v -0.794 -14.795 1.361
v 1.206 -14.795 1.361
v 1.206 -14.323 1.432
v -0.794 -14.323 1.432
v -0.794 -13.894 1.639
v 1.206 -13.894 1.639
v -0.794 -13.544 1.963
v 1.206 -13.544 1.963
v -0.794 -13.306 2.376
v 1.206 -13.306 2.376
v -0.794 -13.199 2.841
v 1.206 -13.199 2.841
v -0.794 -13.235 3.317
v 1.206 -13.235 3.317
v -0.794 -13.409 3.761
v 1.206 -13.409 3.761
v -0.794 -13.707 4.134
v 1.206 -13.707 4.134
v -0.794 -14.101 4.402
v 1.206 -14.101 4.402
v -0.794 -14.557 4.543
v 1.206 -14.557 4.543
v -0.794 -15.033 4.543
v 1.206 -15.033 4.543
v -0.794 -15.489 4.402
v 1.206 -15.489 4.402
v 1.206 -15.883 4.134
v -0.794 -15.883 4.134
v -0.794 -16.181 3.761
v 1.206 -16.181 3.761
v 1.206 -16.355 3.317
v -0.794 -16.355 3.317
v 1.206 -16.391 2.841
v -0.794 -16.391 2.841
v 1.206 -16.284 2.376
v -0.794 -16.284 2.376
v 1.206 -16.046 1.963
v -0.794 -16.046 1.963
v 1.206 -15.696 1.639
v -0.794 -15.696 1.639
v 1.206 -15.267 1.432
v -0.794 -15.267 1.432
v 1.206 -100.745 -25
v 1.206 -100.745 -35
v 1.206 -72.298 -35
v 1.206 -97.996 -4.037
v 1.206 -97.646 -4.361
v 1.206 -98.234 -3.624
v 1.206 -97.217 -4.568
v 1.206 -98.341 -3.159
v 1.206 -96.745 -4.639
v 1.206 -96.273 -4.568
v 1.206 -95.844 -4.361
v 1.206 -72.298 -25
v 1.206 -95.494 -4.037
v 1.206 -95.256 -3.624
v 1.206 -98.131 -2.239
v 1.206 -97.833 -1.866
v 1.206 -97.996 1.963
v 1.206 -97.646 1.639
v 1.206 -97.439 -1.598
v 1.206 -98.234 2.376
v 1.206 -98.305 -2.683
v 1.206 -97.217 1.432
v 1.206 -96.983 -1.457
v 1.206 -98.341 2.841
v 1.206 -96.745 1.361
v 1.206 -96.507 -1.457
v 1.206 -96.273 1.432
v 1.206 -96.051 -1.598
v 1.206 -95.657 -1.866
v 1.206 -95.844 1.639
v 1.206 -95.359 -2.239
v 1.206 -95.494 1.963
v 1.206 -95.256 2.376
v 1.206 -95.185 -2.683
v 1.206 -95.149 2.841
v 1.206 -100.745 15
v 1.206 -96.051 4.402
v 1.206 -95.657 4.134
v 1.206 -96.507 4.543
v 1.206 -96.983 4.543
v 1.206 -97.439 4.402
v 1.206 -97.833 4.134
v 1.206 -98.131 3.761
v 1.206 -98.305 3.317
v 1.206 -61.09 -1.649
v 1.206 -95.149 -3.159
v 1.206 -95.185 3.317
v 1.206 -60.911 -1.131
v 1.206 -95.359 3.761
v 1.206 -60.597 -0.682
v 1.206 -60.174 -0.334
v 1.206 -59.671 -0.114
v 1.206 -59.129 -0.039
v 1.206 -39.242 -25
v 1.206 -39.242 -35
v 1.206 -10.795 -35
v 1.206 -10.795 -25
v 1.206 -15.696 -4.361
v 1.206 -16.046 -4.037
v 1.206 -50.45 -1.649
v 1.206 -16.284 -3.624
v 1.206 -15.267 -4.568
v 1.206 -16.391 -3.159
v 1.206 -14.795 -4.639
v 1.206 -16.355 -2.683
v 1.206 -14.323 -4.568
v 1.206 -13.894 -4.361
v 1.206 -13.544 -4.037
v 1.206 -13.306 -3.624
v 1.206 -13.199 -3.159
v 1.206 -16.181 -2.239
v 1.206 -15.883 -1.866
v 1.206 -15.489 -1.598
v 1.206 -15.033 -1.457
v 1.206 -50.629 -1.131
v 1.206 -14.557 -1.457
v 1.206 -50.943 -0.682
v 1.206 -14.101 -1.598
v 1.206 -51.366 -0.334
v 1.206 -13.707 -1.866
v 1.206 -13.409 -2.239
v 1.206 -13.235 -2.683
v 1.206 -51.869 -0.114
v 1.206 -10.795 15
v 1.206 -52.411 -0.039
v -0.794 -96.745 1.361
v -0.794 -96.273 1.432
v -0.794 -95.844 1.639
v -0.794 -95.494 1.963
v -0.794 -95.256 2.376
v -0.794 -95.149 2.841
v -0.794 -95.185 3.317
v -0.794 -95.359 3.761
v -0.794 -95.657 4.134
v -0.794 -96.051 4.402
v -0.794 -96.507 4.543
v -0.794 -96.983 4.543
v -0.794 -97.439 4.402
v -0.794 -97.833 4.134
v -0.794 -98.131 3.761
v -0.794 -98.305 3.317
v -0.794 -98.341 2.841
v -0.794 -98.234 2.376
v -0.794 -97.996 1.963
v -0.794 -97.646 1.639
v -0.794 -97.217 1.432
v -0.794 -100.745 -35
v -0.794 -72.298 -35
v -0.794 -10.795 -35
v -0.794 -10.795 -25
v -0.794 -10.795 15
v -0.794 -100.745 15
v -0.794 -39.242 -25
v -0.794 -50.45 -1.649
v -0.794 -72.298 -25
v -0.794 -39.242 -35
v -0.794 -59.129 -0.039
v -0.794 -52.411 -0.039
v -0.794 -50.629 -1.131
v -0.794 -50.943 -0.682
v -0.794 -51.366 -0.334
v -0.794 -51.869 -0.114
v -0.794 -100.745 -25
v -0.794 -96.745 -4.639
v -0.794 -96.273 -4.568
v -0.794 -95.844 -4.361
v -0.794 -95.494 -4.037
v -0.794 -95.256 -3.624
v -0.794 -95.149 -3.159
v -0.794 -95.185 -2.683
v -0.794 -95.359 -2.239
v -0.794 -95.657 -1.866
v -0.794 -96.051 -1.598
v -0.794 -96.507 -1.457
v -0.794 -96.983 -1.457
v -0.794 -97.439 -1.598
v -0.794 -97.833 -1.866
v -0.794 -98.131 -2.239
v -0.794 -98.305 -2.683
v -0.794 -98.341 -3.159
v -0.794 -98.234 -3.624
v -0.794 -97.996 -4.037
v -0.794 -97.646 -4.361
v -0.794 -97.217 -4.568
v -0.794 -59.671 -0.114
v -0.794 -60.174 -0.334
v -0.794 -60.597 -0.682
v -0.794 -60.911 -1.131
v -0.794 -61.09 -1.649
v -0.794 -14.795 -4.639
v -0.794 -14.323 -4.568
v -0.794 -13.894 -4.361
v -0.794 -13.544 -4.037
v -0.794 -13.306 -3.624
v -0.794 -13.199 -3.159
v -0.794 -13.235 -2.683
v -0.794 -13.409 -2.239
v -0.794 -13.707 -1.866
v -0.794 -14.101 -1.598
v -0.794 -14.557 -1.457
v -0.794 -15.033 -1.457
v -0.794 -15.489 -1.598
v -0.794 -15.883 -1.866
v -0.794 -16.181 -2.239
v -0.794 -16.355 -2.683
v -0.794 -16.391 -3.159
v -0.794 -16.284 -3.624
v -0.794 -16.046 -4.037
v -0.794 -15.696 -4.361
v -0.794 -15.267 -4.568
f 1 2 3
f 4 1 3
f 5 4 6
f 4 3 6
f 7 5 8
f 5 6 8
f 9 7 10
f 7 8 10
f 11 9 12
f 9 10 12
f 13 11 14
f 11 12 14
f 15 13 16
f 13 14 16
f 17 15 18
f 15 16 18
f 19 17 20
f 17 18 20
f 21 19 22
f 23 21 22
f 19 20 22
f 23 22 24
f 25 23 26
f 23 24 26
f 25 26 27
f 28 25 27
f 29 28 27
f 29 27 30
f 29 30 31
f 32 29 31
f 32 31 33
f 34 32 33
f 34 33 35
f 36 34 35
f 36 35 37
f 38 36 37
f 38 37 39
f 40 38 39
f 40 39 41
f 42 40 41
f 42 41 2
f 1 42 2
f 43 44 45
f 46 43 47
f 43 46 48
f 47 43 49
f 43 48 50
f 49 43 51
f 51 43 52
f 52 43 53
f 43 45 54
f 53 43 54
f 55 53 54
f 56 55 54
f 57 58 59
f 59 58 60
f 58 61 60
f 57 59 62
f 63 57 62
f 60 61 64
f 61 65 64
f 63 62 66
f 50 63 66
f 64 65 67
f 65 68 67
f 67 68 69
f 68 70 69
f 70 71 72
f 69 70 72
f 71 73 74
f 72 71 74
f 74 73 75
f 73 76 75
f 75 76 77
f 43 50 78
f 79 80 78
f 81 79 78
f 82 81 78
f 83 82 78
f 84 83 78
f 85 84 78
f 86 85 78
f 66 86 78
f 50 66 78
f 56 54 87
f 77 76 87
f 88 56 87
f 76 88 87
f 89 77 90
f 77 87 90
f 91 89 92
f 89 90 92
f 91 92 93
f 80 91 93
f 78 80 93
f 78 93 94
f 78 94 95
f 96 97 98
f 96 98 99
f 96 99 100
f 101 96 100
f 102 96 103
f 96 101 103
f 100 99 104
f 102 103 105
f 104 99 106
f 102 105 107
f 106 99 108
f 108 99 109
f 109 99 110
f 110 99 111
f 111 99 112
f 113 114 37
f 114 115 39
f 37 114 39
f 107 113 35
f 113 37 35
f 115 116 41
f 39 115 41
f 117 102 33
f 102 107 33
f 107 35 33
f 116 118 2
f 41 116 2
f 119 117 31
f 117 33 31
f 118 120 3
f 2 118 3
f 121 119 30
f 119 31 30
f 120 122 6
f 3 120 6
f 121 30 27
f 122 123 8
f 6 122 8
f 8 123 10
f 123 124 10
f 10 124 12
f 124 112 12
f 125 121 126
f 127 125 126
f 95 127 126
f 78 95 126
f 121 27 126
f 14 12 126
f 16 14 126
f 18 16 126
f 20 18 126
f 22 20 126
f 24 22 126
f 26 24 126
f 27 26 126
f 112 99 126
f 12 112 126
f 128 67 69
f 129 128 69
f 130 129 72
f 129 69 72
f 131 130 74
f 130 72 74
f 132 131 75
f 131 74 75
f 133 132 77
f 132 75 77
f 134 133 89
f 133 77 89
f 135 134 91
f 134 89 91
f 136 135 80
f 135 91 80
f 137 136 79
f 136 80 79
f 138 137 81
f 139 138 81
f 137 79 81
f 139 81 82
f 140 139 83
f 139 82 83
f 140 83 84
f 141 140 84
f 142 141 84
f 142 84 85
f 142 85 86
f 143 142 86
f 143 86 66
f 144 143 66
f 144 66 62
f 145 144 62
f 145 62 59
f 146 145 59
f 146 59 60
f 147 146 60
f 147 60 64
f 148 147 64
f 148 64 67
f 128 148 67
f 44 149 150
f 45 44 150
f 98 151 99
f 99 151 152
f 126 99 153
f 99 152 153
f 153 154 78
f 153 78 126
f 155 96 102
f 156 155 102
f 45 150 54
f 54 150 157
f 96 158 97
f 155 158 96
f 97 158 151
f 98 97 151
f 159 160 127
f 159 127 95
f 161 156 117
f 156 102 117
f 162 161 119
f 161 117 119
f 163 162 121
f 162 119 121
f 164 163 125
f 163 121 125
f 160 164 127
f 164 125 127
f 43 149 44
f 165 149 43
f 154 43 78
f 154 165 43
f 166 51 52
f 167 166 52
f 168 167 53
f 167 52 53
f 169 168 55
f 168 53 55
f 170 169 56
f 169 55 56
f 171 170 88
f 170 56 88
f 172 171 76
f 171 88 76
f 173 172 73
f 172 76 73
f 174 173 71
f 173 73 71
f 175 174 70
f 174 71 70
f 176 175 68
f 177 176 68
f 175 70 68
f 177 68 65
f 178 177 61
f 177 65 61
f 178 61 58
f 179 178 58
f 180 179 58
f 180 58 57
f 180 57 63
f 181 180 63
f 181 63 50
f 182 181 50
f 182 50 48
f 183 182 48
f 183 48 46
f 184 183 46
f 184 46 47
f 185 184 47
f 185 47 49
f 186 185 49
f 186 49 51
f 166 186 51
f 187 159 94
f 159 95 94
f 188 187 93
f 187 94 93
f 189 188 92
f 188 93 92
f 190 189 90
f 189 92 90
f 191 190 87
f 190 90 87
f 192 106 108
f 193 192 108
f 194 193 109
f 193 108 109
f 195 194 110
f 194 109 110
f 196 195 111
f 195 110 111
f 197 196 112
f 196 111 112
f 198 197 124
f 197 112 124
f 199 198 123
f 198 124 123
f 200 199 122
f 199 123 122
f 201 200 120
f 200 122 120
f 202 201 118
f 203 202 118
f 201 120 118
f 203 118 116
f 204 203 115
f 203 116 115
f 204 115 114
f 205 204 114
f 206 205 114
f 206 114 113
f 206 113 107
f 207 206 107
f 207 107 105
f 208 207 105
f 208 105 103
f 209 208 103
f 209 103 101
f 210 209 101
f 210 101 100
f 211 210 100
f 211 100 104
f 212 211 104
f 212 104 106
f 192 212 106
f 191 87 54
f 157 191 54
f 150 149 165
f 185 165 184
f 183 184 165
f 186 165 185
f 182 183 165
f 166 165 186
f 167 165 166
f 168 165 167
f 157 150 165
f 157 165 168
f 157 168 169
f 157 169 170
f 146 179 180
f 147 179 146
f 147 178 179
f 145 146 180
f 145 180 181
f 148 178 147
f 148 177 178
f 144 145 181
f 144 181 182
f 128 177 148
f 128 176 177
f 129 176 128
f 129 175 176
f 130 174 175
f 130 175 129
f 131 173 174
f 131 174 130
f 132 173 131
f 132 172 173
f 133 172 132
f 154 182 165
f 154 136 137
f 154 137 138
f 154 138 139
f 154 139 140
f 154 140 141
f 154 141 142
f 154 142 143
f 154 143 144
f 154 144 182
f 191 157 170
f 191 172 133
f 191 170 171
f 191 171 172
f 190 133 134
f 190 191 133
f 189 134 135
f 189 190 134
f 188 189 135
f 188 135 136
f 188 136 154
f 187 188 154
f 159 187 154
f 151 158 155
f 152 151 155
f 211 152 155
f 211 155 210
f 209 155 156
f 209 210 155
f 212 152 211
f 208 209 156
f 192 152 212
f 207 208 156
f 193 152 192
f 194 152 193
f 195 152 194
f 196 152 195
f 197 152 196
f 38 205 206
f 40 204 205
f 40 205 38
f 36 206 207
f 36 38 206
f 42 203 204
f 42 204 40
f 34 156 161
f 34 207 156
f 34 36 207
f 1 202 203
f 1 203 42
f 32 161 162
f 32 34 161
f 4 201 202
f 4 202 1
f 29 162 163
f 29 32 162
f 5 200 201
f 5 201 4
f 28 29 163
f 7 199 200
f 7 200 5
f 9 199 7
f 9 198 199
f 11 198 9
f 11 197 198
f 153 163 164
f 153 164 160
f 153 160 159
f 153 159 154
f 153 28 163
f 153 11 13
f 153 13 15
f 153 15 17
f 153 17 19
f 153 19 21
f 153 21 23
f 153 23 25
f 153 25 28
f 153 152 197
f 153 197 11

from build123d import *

# Parameters (mm, degrees)
EXTRUDE_1_DEPTH     = 2
FILLET_1_R          = 2
FILLET_2_R          = 2
FILLET_3_R          = 2
FILLET_4_R          = 2
SKETCH_2_W          = 12
SKETCH_2_H          = 89.95
EXTRUDE_2_DEPTH     = 2
CUT_EXTRUDE_1_DEPTH = 10
SKETCH_7_R          = 1.6
CUT_EXTRUDE_2_DEPTH = 10
SKETCH_8_W          = 10
SKETCH_8_H          = 28.446825321
EXTRUDE_3_DEPTH     = 2


with BuildPart() as part:
    # 草图1 → 凸台-拉伸1 (new body)
    with BuildSketch(Plane(origin=(-0.79375, 0, 0), x_dir=(0, -1, 0), z_dir=(-1, 0, 0))):
        with BuildLine():
            Line((38.795, 5), (12.795, 5))
            ThreePointArc((12.795, 5), (11.380786438, 4.414213562), (10.795, 3))
            Line((10.795, 3), (10.795, -13))
            ThreePointArc((10.795, -13), (11.380786438, -14.414213562), (12.795, -15))
            Line((12.795, -15), (47.795, -15))
            Line((47.795, -15), (50.77, -0.039144756))
            Line((50.77, -0.039144756), (55.77, -0.039144756))
            Line((55.77, -0.039144756), (60.77, -0.039144756))
            Line((60.77, -0.039144756), (63.745, -15))
            Line((63.745, -15), (98.745, -15))
            ThreePointArc((98.745, -15), (100.159213562, -14.414213562), (100.745, -13))
            Line((100.745, -13), (100.745, 3))
            ThreePointArc((100.745, 3), (100.159213562, 4.414213562), (98.745, 5))
            Line((98.745, 5), (72.745, 5))
            Line((72.745, 5), (38.795, 5))
        make_face()
    extrude(amount=-EXTRUDE_1_DEPTH)

    # 圆角1
    fillet_1_edges = [part.edges().sort_by_distance(p)[0] for p in [
        (0.20625, -50.77, -0.039144756),
    ]]
    fillet(fillet_1_edges, radius=FILLET_1_R)

    # 圆角2
    fillet_2_edges = [part.edges().sort_by_distance(p)[0] for p in [
        (0.20625, -47.795, -15),
    ]]
    fillet(fillet_2_edges, radius=FILLET_2_R)

    # 圆角3
    fillet_3_edges = [part.edges().sort_by_distance(p)[0] for p in [
        (0.20625, -60.77, -0.039144756),
    ]]
    fillet(fillet_3_edges, radius=FILLET_3_R)

    # 圆角4
    fillet_4_edges = [part.edges().sort_by_distance(p)[0] for p in [
        (0.20625, -63.745, -15),
    ]]
    fillet(fillet_4_edges, radius=FILLET_4_R)

    # 草图2 → 凸台-拉伸2 (add)
    with BuildSketch(Plane.ZY.offset(0.79375)):
        with Locations((9, -55.77)):
            Rectangle(SKETCH_2_W, SKETCH_2_H)
        Polygon((-25, -10.795), (-25, -45.806477318), (-13.39006724, -48.115138781), (-13, -10.795), align=None)
        Polygon((-13.39006724, -63.424861219), (-25, -65.733522682), (-25, -100.745), (-13, -100.745), align=None)
    extrude(amount=-EXTRUDE_2_DEPTH)

    # 草图5 → 切除-拉伸1 (cut)
    with BuildSketch(Plane(origin=(1.20625, 0, 0), x_dir=(0, 0, -1), z_dir=(1, 0, 0))):
        Polygon((1.649077515, -50.449861219), (25, -45.806477318), (25, -39.241825321), align=None)
        Polygon((25, -72.298174679), (25, -65.733522682), (1.649077515, -61.090138781), align=None)
    extrude(amount=-CUT_EXTRUDE_1_DEPTH, mode=Mode.SUBTRACT)

    # 草图7 → 切除-拉伸2 (cut)
    with BuildSketch(Plane(origin=(1.20625, 0, 0), x_dir=(0, 0, -1), z_dir=(1, 0, 0))):
        with Locations((-2.960855244, -14.795)):
            Circle(SKETCH_7_R)
        with Locations((3.039144756, -14.795)):
            Circle(SKETCH_7_R)
        with Locations((3.039144756, -96.745)):
            Circle(SKETCH_7_R)
        with Locations((-2.960855244, -96.745)):
            Circle(SKETCH_7_R)
    extrude(amount=-CUT_EXTRUDE_2_DEPTH, mode=Mode.SUBTRACT)

    # 草图8 → 凸台-拉伸3 (add)
    with BuildSketch(Plane.ZY.offset(0.79375)):
        with Locations((-30, -25.018412661)):
            Rectangle(SKETCH_8_W, SKETCH_8_H)
        with Locations((-30, -86.52158734)):
            Rectangle(SKETCH_8_W, SKETCH_8_H)
    extrude(amount=-EXTRUDE_3_DEPTH)


solid = part.part
